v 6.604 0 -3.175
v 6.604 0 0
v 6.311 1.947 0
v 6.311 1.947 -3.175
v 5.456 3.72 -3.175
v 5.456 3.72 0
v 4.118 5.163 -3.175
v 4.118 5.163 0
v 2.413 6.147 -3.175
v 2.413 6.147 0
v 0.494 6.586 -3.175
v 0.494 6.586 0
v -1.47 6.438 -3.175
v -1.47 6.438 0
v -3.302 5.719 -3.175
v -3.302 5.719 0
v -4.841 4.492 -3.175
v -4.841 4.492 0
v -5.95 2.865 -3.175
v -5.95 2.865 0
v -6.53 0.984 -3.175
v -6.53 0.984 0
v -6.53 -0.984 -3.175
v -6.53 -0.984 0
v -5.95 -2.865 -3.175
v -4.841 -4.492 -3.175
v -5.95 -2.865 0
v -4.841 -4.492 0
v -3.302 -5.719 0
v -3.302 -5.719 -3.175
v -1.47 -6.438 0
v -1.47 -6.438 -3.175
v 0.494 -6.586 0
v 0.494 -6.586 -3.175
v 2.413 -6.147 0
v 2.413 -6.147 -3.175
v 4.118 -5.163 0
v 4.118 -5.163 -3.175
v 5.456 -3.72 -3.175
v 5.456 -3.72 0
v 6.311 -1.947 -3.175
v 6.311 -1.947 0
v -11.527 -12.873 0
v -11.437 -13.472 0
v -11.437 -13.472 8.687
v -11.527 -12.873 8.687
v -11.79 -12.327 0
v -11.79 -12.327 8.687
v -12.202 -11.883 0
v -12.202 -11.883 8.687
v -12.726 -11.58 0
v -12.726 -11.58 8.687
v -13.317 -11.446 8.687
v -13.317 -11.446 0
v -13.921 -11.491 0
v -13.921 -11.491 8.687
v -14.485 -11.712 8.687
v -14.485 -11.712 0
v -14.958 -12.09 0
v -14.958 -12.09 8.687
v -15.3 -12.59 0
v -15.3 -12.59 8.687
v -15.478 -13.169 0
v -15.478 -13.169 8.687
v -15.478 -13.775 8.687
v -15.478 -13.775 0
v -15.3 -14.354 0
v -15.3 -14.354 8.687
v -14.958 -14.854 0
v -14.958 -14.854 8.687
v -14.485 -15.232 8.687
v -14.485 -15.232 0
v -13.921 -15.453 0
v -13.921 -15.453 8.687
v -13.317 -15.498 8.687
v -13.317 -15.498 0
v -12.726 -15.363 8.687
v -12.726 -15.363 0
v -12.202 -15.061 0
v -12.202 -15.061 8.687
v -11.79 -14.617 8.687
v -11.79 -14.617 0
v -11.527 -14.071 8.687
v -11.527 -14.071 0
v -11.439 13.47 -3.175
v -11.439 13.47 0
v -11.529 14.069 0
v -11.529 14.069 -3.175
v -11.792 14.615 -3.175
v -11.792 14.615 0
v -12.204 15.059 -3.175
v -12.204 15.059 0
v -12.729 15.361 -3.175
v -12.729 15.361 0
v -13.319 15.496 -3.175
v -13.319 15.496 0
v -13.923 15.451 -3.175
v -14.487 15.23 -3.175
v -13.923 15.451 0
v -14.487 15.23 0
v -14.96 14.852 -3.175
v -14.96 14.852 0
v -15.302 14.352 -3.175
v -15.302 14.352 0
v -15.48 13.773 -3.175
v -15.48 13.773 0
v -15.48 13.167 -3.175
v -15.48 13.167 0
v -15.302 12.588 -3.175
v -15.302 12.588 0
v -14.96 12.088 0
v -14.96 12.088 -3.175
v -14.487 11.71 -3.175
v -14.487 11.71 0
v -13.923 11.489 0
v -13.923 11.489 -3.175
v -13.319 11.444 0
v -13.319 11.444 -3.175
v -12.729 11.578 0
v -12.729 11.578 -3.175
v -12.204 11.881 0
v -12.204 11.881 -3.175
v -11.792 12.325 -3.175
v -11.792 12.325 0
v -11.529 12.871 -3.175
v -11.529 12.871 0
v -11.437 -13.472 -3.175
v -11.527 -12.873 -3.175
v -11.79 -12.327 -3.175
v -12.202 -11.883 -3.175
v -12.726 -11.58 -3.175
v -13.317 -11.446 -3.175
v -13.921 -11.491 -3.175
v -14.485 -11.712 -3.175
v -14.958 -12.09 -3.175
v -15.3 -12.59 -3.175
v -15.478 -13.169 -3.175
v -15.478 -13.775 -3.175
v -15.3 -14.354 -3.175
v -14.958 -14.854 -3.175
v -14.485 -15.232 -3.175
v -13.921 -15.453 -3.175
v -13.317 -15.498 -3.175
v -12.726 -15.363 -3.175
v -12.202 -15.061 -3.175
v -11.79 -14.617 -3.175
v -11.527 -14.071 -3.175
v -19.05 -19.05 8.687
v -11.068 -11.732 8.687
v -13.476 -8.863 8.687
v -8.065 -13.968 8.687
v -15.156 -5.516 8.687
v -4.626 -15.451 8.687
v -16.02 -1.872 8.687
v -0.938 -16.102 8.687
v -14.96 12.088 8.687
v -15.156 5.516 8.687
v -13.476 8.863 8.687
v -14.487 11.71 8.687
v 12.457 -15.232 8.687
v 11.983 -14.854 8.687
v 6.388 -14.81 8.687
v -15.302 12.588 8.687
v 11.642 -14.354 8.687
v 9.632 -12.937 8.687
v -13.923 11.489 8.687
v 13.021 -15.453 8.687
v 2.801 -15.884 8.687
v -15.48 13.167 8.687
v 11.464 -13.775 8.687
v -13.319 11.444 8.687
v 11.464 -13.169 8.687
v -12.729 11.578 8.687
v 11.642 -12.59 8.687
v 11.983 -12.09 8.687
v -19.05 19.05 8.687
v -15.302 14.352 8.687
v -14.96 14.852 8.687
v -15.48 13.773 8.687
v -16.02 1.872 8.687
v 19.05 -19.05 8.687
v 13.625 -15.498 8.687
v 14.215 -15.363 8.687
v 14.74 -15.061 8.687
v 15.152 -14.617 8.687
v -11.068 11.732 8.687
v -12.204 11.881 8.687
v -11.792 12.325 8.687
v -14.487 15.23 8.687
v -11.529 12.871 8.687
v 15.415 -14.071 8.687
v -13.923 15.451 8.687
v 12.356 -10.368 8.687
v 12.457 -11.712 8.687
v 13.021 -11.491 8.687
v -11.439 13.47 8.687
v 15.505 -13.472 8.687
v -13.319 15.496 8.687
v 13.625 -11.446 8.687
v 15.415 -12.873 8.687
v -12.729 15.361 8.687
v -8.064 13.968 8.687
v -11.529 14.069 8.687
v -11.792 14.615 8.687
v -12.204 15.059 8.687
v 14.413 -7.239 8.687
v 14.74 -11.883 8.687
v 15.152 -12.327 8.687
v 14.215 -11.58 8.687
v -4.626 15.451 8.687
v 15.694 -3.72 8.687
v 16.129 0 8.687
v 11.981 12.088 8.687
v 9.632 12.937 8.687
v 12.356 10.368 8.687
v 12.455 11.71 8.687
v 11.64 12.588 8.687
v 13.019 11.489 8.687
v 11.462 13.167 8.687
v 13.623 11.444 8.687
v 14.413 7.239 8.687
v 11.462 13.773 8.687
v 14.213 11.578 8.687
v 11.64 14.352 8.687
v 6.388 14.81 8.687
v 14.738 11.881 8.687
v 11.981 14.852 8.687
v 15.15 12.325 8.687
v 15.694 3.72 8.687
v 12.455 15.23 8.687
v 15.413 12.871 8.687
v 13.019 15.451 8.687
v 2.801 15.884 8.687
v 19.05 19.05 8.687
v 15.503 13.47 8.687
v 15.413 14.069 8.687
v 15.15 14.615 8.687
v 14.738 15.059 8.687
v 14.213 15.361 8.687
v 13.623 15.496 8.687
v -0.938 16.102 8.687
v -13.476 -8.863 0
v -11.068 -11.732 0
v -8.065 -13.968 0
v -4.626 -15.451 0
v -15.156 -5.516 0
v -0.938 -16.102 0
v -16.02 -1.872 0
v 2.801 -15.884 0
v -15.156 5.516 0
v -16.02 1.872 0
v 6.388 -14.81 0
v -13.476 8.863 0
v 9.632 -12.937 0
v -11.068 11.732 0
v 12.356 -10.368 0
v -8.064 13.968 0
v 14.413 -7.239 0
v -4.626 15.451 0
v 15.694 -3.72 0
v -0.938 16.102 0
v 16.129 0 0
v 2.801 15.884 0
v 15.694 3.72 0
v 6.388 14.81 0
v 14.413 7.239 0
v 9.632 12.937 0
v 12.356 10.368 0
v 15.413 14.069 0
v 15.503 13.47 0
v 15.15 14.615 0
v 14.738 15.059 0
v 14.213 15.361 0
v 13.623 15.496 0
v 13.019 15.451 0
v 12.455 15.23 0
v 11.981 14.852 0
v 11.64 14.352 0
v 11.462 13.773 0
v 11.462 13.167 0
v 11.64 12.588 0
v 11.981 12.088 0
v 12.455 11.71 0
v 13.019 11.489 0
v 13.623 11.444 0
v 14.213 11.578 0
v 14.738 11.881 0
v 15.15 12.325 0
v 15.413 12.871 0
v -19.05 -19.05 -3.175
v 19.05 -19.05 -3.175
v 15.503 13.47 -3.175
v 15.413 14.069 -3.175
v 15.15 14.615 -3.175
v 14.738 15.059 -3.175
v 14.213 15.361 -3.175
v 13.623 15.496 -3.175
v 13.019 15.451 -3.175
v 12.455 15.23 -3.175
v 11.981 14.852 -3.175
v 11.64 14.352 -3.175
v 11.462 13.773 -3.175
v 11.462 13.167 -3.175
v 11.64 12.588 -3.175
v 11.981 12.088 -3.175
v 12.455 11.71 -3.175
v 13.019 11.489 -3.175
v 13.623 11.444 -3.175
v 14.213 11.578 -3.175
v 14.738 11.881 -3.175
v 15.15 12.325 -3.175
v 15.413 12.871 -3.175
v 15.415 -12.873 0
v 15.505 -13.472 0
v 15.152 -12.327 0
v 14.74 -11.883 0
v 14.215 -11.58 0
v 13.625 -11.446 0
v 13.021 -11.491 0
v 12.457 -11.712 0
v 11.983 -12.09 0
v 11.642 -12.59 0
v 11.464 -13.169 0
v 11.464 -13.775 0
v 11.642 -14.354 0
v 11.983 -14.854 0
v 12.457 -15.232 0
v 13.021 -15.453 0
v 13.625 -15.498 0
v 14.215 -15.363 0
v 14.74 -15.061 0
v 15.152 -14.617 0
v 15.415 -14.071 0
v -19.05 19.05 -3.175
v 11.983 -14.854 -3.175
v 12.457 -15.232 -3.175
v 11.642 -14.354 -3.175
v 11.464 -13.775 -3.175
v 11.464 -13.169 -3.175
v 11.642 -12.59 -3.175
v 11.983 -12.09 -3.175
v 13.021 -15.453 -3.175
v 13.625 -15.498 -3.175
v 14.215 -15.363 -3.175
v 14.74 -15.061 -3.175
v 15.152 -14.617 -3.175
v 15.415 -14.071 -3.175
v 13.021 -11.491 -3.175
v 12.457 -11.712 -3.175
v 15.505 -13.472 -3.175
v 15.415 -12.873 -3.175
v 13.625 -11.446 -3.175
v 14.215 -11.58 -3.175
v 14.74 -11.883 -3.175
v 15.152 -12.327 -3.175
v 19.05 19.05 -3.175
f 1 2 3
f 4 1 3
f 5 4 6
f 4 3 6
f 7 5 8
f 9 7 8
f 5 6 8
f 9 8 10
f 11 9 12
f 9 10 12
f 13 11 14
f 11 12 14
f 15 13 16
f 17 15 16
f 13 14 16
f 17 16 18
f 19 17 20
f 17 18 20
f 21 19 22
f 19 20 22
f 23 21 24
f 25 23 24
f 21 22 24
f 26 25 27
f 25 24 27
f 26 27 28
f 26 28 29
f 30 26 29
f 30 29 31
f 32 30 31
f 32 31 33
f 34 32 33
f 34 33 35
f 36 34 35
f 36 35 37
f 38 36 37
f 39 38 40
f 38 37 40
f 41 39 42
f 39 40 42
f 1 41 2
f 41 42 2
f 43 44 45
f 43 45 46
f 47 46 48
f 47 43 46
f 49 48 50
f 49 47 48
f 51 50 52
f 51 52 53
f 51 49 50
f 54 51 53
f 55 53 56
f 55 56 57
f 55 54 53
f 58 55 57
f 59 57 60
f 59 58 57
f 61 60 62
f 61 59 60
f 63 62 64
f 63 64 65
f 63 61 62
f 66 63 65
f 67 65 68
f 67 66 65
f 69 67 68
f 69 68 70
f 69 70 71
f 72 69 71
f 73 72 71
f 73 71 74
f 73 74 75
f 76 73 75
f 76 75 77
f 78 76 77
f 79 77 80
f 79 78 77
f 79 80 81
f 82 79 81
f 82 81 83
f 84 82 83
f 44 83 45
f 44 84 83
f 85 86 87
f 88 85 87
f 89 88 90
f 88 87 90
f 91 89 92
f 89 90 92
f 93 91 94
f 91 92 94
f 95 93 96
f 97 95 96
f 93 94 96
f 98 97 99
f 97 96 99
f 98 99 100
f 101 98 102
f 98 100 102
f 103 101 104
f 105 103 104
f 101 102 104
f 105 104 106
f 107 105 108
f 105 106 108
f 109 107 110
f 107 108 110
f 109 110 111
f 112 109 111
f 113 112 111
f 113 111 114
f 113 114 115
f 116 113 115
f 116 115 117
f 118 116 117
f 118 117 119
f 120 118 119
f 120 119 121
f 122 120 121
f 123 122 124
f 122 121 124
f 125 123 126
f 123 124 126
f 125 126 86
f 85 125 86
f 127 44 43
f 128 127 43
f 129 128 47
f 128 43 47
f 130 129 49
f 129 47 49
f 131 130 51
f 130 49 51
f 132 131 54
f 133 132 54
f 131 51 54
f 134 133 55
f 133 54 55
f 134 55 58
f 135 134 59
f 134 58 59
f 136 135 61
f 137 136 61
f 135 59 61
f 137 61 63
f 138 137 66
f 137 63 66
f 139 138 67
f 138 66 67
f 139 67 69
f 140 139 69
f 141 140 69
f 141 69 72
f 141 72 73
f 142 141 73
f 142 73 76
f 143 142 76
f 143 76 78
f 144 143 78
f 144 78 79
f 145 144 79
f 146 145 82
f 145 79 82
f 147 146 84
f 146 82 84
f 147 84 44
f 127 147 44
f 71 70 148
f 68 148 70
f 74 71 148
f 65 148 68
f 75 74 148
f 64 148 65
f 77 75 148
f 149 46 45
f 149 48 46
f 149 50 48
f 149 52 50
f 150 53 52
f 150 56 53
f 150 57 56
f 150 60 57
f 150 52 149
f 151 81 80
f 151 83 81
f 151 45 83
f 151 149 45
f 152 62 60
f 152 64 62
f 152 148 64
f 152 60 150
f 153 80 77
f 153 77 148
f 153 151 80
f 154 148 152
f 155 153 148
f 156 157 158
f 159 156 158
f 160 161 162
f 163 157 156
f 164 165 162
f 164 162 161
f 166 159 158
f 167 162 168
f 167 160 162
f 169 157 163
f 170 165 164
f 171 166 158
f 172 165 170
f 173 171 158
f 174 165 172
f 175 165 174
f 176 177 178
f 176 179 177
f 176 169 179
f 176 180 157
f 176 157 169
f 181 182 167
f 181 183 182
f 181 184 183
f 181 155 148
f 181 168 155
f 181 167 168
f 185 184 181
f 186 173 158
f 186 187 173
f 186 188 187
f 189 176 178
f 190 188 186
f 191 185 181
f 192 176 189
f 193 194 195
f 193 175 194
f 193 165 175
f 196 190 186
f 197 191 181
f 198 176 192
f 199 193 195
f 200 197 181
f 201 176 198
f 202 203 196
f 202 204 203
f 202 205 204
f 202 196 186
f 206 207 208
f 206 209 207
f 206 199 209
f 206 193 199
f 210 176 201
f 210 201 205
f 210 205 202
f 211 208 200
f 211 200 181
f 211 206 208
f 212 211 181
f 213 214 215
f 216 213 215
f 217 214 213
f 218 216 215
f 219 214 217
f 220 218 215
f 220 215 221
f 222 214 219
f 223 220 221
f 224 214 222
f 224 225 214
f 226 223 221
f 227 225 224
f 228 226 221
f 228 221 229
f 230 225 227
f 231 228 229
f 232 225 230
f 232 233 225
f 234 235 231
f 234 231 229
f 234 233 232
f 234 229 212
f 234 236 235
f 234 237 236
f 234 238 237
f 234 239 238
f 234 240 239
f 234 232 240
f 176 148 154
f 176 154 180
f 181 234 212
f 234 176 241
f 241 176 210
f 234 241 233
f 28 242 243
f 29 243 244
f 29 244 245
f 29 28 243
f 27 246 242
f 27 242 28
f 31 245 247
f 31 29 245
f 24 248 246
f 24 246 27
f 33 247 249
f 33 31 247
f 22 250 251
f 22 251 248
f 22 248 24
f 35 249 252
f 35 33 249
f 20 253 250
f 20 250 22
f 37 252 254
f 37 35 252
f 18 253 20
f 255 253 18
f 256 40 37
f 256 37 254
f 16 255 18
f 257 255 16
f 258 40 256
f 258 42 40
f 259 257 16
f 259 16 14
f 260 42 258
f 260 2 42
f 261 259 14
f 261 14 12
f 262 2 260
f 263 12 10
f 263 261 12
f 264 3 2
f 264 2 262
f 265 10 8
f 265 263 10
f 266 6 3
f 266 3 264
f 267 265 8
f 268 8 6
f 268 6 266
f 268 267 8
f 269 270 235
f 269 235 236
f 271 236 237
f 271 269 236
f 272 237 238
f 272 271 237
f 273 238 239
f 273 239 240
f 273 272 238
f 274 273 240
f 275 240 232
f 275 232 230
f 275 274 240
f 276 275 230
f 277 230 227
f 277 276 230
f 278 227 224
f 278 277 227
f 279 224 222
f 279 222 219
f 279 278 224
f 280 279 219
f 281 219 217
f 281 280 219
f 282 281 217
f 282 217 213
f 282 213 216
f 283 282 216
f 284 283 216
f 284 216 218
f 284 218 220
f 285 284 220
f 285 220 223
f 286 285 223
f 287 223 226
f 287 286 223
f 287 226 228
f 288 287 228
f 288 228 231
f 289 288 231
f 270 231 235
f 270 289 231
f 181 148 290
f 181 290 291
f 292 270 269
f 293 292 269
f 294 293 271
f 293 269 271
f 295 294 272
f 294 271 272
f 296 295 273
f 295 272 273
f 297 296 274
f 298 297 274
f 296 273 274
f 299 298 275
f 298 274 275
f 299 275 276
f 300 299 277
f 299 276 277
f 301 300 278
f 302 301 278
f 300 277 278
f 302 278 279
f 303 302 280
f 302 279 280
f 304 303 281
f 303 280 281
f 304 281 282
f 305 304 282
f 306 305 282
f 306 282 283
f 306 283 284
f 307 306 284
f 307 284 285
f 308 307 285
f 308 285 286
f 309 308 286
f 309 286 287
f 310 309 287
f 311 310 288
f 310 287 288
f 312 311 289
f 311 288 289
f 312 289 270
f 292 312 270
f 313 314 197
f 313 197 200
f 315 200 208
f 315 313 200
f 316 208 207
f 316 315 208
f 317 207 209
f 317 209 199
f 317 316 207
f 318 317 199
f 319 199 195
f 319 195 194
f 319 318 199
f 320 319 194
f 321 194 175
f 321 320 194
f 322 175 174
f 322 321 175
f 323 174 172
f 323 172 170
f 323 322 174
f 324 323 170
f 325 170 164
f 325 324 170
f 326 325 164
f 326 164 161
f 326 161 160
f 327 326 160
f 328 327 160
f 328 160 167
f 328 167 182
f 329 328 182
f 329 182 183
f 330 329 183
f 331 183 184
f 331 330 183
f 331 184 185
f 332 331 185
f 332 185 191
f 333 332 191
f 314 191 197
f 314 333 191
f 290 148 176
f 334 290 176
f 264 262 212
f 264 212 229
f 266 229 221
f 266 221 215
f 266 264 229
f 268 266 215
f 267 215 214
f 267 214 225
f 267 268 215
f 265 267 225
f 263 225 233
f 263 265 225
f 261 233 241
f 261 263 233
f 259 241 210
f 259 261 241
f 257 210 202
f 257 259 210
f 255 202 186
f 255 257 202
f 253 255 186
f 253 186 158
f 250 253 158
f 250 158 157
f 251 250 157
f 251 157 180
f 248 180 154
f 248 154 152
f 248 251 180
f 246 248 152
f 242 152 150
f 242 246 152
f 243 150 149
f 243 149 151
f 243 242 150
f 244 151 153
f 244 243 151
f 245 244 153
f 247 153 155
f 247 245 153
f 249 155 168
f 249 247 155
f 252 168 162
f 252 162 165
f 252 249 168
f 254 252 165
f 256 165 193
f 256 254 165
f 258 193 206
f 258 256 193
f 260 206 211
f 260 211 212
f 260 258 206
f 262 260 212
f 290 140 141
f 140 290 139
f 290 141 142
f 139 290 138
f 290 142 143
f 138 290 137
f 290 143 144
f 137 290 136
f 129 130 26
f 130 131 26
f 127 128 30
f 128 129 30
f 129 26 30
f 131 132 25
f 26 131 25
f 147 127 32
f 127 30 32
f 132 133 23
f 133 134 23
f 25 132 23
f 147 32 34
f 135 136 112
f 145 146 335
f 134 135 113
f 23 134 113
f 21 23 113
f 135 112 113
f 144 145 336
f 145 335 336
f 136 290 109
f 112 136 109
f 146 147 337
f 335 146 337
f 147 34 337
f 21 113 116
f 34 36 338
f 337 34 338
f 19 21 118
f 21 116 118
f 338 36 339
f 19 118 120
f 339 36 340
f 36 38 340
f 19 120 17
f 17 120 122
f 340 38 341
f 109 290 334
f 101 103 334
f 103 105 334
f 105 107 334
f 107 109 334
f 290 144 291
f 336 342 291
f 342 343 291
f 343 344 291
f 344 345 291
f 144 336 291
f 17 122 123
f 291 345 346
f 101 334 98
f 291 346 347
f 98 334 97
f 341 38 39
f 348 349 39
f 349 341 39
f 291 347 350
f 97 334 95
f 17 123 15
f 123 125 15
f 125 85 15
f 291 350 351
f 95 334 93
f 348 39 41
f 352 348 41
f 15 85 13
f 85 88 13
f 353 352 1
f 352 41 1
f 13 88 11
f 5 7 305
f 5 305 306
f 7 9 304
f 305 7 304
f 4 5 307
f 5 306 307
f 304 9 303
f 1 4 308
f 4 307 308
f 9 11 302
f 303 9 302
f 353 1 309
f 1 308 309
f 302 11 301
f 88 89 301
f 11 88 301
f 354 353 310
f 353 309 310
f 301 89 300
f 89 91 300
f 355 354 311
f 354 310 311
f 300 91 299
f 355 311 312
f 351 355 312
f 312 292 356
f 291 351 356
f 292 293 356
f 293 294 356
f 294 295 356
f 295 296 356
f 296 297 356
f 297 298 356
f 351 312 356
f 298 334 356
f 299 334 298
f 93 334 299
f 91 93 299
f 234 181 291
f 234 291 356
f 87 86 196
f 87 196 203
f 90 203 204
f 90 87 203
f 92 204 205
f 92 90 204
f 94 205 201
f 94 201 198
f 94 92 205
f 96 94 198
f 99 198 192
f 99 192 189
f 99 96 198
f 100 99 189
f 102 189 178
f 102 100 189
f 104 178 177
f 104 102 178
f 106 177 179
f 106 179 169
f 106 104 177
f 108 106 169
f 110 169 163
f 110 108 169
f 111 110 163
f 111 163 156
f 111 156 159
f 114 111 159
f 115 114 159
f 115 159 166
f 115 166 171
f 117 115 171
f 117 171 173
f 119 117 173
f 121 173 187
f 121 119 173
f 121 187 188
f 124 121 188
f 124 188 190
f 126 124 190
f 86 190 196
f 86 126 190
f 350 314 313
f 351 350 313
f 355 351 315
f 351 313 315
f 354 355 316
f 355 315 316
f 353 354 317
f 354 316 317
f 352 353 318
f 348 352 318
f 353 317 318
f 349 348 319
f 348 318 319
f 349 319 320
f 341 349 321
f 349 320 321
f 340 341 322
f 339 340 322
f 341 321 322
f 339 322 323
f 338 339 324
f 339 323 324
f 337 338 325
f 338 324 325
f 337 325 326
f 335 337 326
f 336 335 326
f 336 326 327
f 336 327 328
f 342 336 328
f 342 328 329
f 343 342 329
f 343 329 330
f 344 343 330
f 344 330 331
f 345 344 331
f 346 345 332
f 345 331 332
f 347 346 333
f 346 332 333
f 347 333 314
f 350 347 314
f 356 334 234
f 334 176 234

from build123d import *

# Parameters (mm, degrees)
F0_W     = 38.1
F0_H     = 38.1
F0_R     = 2.032
F0_R_2   = 16.129
F1_DEPTH = 8.6868
F2_W     = 38.1
F2_H     = 38.1
F2_R     = 6.604
F3_DEPTH = 3.175
F4_DEPTH = 3.175


# Not quite as in the source:
# - a feature of the source that left no trace in its solid (it failed there, or was rolled back) is left out


with BuildPart() as f1:
    # F0 (on Top) → F1 (new body)
    with BuildSketch(Plane.XY):
        Rectangle(F0_W, F0_H)
        with Locations((-13.4688665365, -13.4719016558)):
            Circle(F0_R, mode=Mode.SUBTRACT)
        with Locations((13.4729134635, -13.4719016558)):
            Circle(F0_R, mode=Mode.SUBTRACT)
        with Locations((-13.47089, 13.4698783442)):
            Circle(F0_R, mode=Mode.SUBTRACT)
        Circle(F0_R_2, mode=Mode.SUBTRACT)
        with Locations((13.47089, 13.4698783442)):
            Circle(F0_R, mode=Mode.SUBTRACT)
    extrude(amount=F1_DEPTH)

    # F2 (on Top) → F3 (join)
    with BuildSketch(Plane.XY):
        Rectangle(F2_W, F2_H)
        Circle(F2_R, mode=Mode.SUBTRACT)
    extrude(amount=-F3_DEPTH)

    # F4 (cut, through all): faces of the model
    f4_faces = [f1.faces().sort_by_distance(p)[0] for p in [
        (-13.47089, 13.4698783442, 0),
        (-13.4688665365, -13.4719016558, 0),
        (13.4729134635, -13.4719016558, 0),
        (13.47089, 13.4698783442, 0),
    ]]
    extrude(f4_faces, amount=-F4_DEPTH, mode=Mode.SUBTRACT)


solid = f1.part
